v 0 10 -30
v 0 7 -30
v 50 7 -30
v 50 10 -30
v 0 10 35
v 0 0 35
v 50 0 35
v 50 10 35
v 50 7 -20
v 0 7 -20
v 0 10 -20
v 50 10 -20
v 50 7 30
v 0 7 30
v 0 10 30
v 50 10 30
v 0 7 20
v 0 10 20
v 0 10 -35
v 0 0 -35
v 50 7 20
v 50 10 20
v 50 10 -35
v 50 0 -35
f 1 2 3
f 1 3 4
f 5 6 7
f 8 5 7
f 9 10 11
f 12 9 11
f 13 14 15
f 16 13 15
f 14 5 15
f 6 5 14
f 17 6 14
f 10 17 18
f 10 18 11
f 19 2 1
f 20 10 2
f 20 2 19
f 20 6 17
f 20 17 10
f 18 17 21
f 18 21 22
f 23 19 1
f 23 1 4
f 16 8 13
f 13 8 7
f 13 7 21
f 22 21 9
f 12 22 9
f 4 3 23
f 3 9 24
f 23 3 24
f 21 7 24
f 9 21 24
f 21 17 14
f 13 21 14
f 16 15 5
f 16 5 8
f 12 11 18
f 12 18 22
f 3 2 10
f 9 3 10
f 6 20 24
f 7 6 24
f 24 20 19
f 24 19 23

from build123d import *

# Parameters (mm, degrees)
SKETCH1_W           = 50
SKETCH1_H           = 70
BOSS_EXTRUDE1_DEPTH = 10
SKETCH3_W           = 10
SKETCH3_H           = 3
CUT_EXTRUDE1_DEPTH  = 62.846584384


with BuildPart() as part:
    # Sketch1 → Boss-Extrude1 (new body)
    with BuildSketch(Plane(origin=(0, 0, 0), x_dir=(1, 0, 0), z_dir=(0, 1, 0))):
        with Locations((25, 0)):
            Rectangle(SKETCH1_W, SKETCH1_H)
    extrude(amount=BOSS_EXTRUDE1_DEPTH)

    # Sketch3 → Cut-Extrude1 (cut, through all)
    with BuildSketch(Plane.ZY):
        with Locations((-25, 8.5)):
            Rectangle(SKETCH3_W, SKETCH3_H)
        with Locations((25, 8.5)):
            Rectangle(SKETCH3_W, SKETCH3_H)
    extrude(amount=-CUT_EXTRUDE1_DEPTH, mode=Mode.SUBTRACT)


solid = part.part
